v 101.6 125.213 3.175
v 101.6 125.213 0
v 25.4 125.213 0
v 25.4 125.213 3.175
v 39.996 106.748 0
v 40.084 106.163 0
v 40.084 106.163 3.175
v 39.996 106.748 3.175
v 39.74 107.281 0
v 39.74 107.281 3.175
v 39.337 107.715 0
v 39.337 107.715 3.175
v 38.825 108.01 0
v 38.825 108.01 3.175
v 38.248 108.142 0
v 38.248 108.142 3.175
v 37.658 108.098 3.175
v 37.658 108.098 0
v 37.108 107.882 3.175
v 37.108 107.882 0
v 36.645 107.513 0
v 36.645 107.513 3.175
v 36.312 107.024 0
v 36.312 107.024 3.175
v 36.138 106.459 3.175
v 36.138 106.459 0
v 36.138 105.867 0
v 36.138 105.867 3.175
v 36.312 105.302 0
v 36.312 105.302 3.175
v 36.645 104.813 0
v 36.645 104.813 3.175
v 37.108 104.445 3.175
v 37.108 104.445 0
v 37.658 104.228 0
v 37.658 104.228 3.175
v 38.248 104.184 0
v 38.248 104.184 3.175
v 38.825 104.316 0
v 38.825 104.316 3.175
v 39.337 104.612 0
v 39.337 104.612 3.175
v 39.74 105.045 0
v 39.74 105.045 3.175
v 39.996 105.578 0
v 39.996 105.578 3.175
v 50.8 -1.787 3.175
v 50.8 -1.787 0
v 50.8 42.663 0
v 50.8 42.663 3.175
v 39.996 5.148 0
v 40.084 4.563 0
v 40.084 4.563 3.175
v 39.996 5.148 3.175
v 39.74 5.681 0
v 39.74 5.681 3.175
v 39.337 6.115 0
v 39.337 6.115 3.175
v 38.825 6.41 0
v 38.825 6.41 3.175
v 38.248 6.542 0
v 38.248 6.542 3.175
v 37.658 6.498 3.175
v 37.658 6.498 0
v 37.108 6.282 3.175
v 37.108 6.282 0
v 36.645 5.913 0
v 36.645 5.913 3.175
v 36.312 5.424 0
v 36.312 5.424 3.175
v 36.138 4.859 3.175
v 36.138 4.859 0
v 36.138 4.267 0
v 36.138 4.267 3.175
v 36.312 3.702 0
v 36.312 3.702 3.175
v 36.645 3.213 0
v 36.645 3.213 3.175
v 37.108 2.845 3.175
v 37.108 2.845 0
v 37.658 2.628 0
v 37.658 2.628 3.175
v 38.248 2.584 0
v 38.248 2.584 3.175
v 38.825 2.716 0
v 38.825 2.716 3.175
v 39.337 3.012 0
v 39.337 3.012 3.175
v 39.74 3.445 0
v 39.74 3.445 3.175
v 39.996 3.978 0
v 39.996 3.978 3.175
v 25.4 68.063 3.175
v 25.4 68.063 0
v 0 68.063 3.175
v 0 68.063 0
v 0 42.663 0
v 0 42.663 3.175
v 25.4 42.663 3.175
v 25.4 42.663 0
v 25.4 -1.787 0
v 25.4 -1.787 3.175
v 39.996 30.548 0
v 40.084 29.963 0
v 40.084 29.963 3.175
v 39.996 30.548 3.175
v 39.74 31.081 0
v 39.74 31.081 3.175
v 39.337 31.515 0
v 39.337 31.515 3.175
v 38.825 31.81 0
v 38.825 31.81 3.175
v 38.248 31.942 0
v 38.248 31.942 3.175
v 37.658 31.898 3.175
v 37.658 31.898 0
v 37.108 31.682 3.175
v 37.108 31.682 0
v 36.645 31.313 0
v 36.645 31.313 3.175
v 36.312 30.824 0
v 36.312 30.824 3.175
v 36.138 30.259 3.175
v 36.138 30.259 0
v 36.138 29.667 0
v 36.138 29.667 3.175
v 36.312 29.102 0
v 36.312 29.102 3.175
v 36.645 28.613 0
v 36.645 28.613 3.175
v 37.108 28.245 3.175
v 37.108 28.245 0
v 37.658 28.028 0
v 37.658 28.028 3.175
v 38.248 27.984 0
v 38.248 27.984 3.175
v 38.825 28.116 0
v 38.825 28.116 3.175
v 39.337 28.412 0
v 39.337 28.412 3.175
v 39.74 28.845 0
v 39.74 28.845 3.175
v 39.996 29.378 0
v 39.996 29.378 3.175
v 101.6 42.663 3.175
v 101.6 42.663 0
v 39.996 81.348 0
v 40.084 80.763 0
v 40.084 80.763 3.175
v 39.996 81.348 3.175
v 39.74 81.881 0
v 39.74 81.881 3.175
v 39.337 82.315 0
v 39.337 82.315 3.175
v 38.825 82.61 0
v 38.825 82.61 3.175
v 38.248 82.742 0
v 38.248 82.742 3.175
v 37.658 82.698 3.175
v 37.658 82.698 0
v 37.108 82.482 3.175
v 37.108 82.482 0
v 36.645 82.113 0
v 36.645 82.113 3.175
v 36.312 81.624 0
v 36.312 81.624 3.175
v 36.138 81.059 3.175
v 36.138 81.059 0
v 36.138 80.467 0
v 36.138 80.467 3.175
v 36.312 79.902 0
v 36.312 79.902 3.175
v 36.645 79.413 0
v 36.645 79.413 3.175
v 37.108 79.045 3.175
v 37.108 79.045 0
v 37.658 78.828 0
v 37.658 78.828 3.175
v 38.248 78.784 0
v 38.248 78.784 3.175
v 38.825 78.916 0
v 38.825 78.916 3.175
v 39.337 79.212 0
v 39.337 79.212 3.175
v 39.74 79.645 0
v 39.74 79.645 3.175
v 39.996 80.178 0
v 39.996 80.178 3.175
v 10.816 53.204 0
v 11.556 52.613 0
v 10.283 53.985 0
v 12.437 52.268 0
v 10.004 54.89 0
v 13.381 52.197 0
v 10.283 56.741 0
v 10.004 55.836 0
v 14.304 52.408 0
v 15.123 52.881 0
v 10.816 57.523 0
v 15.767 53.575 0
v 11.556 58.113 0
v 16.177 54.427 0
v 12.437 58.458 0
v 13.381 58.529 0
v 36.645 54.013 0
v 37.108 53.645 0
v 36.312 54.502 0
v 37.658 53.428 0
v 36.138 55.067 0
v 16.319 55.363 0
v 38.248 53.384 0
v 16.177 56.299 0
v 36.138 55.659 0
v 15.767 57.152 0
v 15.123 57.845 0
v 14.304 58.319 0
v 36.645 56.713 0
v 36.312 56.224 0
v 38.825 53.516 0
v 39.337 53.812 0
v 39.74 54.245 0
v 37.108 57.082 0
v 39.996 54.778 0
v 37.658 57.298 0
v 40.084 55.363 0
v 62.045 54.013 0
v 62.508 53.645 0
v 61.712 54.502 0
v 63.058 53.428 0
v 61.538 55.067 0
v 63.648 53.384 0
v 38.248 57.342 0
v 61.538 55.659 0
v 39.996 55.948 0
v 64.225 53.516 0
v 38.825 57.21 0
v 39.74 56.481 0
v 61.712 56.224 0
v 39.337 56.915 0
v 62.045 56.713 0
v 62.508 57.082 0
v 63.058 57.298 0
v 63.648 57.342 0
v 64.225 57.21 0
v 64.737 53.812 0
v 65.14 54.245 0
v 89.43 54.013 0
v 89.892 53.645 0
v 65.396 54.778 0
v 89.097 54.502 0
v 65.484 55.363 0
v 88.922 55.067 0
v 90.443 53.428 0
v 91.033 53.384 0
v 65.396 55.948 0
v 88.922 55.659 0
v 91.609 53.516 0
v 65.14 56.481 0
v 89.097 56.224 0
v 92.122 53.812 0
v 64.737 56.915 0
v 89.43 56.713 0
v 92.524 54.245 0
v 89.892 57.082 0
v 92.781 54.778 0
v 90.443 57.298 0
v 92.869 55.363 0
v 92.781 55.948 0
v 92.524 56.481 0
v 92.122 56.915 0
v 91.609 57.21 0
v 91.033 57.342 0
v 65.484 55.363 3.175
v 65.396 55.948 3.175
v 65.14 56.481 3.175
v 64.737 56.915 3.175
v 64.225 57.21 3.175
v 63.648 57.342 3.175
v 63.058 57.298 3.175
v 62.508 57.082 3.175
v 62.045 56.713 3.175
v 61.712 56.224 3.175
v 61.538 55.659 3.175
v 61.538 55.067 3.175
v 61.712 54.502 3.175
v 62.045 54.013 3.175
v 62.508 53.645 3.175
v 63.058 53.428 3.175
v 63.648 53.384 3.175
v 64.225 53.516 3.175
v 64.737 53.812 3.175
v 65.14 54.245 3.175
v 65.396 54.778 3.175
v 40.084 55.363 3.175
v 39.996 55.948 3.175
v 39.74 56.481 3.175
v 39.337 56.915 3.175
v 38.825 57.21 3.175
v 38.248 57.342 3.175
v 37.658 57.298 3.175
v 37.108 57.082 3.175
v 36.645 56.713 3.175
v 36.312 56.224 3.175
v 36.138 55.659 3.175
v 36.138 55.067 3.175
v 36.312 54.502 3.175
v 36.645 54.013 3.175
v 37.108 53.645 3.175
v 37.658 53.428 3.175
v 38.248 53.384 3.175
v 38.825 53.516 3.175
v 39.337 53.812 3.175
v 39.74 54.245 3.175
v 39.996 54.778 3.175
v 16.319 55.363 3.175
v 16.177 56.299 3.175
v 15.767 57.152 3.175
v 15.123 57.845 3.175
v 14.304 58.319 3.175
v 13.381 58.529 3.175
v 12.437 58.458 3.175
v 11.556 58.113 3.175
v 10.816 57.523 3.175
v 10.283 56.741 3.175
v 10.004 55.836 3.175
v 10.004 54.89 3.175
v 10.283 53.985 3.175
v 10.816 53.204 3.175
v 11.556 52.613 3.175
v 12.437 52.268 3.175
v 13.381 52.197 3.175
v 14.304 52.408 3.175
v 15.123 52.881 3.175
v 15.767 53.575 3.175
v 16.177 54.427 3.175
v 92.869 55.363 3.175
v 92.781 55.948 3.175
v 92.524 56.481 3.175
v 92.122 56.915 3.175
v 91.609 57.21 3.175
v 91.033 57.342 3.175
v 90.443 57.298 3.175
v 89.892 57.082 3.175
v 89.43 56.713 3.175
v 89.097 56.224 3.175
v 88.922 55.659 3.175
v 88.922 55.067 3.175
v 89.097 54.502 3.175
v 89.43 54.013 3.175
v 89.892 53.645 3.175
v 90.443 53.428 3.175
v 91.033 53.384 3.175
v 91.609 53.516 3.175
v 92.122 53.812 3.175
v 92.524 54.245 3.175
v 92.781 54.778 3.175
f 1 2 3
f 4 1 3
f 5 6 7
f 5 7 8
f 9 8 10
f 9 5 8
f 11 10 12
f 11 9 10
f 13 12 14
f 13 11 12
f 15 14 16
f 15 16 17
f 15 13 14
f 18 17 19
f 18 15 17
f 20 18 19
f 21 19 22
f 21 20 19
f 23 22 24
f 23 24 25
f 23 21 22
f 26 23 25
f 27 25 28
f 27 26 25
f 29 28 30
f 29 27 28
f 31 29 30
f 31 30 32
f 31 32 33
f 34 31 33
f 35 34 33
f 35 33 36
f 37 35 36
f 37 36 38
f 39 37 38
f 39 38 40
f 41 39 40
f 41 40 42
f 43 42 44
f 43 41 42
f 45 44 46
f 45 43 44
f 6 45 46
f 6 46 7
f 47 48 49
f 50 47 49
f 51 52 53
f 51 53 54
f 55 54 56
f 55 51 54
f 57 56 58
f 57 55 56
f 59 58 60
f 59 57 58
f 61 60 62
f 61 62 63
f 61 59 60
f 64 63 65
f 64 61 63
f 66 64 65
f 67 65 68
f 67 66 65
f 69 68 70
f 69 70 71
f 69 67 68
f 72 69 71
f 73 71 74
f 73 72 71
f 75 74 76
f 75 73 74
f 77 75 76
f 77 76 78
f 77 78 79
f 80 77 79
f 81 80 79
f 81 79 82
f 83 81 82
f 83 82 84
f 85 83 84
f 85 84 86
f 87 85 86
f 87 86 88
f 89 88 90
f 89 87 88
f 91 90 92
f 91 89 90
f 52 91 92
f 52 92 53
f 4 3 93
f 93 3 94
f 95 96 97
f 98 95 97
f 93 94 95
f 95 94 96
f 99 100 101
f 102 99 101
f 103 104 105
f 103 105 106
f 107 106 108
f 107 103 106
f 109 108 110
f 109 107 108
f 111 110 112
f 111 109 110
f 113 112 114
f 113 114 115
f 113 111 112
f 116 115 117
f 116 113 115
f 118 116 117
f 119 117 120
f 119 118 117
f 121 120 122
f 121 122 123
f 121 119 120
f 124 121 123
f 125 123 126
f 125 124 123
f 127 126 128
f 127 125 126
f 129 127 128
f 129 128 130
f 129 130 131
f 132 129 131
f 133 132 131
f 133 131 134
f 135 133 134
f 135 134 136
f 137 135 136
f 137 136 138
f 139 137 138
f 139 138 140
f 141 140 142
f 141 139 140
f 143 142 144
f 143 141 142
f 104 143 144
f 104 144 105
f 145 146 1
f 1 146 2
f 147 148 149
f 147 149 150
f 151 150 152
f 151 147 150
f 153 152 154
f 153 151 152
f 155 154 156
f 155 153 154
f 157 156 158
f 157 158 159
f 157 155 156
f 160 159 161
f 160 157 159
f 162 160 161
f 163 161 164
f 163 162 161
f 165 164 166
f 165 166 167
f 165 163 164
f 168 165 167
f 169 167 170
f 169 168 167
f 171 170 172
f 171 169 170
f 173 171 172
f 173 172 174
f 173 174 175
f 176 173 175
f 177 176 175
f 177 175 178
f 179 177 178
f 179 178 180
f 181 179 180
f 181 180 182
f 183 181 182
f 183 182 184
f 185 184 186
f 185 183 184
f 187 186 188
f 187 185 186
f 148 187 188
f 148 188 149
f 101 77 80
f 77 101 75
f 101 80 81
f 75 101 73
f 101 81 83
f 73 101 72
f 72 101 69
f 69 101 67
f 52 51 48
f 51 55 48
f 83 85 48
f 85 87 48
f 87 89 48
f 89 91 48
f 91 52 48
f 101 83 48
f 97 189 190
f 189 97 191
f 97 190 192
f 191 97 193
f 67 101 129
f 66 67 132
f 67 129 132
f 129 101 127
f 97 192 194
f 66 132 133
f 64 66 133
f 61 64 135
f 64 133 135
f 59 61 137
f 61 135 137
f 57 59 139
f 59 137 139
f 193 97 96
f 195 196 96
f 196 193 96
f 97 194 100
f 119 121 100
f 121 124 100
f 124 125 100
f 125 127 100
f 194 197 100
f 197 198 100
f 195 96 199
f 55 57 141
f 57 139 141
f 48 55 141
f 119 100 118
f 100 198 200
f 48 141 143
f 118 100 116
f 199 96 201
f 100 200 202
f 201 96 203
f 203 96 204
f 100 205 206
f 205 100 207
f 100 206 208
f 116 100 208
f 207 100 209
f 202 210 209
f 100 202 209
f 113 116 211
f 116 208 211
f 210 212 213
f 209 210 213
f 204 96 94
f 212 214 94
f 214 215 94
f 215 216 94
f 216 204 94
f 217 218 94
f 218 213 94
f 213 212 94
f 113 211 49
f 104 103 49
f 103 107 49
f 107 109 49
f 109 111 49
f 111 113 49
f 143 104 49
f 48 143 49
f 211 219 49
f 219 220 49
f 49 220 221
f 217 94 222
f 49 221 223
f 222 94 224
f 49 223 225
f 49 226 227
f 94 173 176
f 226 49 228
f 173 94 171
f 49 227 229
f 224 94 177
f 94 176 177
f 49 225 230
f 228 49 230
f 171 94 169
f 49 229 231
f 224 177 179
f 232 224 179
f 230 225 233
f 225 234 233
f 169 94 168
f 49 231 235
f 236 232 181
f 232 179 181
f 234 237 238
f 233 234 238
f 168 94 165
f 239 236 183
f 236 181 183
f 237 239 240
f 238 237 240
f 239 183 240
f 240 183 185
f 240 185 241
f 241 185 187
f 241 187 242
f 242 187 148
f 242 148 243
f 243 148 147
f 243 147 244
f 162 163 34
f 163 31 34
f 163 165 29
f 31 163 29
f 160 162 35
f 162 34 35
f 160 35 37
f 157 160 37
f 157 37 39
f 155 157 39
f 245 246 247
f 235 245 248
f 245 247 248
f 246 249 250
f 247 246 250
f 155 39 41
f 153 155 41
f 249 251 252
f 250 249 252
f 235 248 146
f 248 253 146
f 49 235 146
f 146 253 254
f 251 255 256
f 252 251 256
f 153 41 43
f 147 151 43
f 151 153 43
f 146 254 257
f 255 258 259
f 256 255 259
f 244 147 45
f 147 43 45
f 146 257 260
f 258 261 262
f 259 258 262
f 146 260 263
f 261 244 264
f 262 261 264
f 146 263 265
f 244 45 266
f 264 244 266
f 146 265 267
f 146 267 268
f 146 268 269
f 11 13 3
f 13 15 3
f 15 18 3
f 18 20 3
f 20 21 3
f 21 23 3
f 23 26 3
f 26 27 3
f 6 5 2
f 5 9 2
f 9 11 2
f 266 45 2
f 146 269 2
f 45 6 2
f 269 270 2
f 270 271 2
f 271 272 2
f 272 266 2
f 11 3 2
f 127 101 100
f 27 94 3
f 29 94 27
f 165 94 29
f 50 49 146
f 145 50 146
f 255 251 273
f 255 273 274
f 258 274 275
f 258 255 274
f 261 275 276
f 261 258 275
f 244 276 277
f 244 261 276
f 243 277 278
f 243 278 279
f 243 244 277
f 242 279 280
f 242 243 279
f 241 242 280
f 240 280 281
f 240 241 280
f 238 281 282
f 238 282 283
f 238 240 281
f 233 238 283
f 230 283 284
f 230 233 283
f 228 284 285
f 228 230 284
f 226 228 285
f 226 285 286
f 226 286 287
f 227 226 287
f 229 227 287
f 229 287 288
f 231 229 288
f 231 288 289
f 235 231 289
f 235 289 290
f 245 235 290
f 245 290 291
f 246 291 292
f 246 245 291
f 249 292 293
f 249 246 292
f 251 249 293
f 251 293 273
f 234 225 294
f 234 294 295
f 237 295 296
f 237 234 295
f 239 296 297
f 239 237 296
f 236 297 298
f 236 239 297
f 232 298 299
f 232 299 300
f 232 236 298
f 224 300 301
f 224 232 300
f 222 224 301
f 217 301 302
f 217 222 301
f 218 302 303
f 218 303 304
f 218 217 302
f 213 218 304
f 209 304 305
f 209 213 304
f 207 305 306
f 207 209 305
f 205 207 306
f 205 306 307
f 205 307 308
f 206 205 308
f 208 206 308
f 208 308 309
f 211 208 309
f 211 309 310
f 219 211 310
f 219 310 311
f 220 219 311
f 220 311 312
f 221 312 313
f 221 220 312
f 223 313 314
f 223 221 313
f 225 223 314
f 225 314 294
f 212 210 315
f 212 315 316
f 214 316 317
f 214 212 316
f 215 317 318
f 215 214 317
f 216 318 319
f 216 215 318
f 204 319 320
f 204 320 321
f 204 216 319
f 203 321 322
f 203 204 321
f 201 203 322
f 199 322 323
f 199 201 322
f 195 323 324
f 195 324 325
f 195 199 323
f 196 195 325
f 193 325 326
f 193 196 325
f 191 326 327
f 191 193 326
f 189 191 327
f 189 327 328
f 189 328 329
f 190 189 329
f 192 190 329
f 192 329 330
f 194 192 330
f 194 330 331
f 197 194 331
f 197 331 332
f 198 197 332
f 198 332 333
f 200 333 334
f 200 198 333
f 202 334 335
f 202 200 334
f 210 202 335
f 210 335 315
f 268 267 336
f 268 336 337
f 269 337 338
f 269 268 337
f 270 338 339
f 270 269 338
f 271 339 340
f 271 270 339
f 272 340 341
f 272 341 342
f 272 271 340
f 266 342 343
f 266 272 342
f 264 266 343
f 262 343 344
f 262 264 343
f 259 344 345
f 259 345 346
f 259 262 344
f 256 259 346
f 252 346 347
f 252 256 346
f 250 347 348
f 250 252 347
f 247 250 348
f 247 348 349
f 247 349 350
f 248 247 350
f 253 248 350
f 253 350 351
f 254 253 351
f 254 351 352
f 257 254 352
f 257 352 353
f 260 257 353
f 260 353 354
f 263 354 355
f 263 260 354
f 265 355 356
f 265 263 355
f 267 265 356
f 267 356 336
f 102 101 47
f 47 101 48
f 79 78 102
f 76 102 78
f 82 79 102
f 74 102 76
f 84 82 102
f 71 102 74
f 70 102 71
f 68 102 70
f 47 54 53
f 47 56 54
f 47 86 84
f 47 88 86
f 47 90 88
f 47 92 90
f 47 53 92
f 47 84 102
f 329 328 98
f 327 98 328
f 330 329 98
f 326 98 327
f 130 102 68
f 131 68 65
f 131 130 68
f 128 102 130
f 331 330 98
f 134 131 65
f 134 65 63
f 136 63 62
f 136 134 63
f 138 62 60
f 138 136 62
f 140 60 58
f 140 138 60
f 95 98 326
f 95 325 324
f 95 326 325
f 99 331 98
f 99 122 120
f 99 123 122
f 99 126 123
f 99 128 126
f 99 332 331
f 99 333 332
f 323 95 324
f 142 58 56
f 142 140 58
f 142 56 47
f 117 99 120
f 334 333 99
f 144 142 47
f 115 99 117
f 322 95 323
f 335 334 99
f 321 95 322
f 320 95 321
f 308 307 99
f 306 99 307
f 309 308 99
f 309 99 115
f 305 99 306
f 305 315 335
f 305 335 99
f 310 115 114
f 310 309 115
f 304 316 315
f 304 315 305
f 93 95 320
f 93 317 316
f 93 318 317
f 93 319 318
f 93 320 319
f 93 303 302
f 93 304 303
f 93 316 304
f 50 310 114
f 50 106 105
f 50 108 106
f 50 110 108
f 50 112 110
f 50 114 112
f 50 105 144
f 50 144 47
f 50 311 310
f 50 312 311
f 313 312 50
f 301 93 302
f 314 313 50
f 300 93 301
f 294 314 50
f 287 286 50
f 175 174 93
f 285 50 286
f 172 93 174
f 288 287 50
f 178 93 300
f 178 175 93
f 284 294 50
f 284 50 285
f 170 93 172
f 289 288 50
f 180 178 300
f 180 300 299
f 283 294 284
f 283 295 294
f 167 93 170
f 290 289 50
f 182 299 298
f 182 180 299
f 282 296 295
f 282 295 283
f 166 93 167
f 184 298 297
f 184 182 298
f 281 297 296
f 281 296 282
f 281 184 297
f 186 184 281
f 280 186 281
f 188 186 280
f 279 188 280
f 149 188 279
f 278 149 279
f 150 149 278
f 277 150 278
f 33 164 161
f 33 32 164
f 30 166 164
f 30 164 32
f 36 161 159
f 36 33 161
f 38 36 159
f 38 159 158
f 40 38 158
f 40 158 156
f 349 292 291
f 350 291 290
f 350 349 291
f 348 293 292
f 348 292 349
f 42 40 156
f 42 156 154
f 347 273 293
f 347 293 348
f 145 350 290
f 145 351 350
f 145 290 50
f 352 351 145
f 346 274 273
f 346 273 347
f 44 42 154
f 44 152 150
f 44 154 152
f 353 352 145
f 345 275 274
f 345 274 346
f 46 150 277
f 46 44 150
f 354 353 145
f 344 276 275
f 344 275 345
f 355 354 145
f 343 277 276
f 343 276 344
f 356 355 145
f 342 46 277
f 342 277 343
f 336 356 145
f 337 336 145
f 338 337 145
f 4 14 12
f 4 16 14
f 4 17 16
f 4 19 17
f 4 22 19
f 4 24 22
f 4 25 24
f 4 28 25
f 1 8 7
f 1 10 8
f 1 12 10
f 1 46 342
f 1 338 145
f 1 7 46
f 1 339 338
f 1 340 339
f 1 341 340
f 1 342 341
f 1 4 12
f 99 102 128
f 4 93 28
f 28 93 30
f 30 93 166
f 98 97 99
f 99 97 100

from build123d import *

# Parameters (mm, degrees)
SKETCH1_R           = 1.984375
SKETCH1_R_2         = 3.175
BOSS_EXTRUDE1_DEPTH = 3.175


with BuildPart() as part:
    # Sketch1 → Boss-Extrude1 (new body)
    with BuildSketch(Plane.XY):
        Polygon((25.4, 42.663065327), (25.4, -1.786934673), (50.8, -1.786934673), (50.8, 42.663065327), (101.6, 42.663065327), (101.6, 125.213065327), (25.4, 125.213065327), (25.4, 68.063065327), (0, 68.063065327), (0, 42.663065327), align=None)
        with Locations((38.1, 4.563065327)):
            Circle(SKETCH1_R, mode=Mode.SUBTRACT)
        with Locations((13.143553611, 55.363065327)):
            Circle(SKETCH1_R_2, mode=Mode.SUBTRACT)
        with Locations((38.1, 29.963065327)):
            Circle(SKETCH1_R, mode=Mode.SUBTRACT)
        with Locations((38.1, 55.363065327)):
            Circle(SKETCH1_R, mode=Mode.SUBTRACT)
        with Locations((63.5, 55.363065327)):
            Circle(SKETCH1_R, mode=Mode.SUBTRACT)
        with Locations((90.884375, 55.363065327)):
            Circle(SKETCH1_R, mode=Mode.SUBTRACT)
        with Locations((38.1, 80.763065327)):
            Circle(SKETCH1_R, mode=Mode.SUBTRACT)
        with Locations((38.1, 106.163065327)):
            Circle(SKETCH1_R, mode=Mode.SUBTRACT)
    extrude(amount=BOSS_EXTRUDE1_DEPTH)


solid = part.part
